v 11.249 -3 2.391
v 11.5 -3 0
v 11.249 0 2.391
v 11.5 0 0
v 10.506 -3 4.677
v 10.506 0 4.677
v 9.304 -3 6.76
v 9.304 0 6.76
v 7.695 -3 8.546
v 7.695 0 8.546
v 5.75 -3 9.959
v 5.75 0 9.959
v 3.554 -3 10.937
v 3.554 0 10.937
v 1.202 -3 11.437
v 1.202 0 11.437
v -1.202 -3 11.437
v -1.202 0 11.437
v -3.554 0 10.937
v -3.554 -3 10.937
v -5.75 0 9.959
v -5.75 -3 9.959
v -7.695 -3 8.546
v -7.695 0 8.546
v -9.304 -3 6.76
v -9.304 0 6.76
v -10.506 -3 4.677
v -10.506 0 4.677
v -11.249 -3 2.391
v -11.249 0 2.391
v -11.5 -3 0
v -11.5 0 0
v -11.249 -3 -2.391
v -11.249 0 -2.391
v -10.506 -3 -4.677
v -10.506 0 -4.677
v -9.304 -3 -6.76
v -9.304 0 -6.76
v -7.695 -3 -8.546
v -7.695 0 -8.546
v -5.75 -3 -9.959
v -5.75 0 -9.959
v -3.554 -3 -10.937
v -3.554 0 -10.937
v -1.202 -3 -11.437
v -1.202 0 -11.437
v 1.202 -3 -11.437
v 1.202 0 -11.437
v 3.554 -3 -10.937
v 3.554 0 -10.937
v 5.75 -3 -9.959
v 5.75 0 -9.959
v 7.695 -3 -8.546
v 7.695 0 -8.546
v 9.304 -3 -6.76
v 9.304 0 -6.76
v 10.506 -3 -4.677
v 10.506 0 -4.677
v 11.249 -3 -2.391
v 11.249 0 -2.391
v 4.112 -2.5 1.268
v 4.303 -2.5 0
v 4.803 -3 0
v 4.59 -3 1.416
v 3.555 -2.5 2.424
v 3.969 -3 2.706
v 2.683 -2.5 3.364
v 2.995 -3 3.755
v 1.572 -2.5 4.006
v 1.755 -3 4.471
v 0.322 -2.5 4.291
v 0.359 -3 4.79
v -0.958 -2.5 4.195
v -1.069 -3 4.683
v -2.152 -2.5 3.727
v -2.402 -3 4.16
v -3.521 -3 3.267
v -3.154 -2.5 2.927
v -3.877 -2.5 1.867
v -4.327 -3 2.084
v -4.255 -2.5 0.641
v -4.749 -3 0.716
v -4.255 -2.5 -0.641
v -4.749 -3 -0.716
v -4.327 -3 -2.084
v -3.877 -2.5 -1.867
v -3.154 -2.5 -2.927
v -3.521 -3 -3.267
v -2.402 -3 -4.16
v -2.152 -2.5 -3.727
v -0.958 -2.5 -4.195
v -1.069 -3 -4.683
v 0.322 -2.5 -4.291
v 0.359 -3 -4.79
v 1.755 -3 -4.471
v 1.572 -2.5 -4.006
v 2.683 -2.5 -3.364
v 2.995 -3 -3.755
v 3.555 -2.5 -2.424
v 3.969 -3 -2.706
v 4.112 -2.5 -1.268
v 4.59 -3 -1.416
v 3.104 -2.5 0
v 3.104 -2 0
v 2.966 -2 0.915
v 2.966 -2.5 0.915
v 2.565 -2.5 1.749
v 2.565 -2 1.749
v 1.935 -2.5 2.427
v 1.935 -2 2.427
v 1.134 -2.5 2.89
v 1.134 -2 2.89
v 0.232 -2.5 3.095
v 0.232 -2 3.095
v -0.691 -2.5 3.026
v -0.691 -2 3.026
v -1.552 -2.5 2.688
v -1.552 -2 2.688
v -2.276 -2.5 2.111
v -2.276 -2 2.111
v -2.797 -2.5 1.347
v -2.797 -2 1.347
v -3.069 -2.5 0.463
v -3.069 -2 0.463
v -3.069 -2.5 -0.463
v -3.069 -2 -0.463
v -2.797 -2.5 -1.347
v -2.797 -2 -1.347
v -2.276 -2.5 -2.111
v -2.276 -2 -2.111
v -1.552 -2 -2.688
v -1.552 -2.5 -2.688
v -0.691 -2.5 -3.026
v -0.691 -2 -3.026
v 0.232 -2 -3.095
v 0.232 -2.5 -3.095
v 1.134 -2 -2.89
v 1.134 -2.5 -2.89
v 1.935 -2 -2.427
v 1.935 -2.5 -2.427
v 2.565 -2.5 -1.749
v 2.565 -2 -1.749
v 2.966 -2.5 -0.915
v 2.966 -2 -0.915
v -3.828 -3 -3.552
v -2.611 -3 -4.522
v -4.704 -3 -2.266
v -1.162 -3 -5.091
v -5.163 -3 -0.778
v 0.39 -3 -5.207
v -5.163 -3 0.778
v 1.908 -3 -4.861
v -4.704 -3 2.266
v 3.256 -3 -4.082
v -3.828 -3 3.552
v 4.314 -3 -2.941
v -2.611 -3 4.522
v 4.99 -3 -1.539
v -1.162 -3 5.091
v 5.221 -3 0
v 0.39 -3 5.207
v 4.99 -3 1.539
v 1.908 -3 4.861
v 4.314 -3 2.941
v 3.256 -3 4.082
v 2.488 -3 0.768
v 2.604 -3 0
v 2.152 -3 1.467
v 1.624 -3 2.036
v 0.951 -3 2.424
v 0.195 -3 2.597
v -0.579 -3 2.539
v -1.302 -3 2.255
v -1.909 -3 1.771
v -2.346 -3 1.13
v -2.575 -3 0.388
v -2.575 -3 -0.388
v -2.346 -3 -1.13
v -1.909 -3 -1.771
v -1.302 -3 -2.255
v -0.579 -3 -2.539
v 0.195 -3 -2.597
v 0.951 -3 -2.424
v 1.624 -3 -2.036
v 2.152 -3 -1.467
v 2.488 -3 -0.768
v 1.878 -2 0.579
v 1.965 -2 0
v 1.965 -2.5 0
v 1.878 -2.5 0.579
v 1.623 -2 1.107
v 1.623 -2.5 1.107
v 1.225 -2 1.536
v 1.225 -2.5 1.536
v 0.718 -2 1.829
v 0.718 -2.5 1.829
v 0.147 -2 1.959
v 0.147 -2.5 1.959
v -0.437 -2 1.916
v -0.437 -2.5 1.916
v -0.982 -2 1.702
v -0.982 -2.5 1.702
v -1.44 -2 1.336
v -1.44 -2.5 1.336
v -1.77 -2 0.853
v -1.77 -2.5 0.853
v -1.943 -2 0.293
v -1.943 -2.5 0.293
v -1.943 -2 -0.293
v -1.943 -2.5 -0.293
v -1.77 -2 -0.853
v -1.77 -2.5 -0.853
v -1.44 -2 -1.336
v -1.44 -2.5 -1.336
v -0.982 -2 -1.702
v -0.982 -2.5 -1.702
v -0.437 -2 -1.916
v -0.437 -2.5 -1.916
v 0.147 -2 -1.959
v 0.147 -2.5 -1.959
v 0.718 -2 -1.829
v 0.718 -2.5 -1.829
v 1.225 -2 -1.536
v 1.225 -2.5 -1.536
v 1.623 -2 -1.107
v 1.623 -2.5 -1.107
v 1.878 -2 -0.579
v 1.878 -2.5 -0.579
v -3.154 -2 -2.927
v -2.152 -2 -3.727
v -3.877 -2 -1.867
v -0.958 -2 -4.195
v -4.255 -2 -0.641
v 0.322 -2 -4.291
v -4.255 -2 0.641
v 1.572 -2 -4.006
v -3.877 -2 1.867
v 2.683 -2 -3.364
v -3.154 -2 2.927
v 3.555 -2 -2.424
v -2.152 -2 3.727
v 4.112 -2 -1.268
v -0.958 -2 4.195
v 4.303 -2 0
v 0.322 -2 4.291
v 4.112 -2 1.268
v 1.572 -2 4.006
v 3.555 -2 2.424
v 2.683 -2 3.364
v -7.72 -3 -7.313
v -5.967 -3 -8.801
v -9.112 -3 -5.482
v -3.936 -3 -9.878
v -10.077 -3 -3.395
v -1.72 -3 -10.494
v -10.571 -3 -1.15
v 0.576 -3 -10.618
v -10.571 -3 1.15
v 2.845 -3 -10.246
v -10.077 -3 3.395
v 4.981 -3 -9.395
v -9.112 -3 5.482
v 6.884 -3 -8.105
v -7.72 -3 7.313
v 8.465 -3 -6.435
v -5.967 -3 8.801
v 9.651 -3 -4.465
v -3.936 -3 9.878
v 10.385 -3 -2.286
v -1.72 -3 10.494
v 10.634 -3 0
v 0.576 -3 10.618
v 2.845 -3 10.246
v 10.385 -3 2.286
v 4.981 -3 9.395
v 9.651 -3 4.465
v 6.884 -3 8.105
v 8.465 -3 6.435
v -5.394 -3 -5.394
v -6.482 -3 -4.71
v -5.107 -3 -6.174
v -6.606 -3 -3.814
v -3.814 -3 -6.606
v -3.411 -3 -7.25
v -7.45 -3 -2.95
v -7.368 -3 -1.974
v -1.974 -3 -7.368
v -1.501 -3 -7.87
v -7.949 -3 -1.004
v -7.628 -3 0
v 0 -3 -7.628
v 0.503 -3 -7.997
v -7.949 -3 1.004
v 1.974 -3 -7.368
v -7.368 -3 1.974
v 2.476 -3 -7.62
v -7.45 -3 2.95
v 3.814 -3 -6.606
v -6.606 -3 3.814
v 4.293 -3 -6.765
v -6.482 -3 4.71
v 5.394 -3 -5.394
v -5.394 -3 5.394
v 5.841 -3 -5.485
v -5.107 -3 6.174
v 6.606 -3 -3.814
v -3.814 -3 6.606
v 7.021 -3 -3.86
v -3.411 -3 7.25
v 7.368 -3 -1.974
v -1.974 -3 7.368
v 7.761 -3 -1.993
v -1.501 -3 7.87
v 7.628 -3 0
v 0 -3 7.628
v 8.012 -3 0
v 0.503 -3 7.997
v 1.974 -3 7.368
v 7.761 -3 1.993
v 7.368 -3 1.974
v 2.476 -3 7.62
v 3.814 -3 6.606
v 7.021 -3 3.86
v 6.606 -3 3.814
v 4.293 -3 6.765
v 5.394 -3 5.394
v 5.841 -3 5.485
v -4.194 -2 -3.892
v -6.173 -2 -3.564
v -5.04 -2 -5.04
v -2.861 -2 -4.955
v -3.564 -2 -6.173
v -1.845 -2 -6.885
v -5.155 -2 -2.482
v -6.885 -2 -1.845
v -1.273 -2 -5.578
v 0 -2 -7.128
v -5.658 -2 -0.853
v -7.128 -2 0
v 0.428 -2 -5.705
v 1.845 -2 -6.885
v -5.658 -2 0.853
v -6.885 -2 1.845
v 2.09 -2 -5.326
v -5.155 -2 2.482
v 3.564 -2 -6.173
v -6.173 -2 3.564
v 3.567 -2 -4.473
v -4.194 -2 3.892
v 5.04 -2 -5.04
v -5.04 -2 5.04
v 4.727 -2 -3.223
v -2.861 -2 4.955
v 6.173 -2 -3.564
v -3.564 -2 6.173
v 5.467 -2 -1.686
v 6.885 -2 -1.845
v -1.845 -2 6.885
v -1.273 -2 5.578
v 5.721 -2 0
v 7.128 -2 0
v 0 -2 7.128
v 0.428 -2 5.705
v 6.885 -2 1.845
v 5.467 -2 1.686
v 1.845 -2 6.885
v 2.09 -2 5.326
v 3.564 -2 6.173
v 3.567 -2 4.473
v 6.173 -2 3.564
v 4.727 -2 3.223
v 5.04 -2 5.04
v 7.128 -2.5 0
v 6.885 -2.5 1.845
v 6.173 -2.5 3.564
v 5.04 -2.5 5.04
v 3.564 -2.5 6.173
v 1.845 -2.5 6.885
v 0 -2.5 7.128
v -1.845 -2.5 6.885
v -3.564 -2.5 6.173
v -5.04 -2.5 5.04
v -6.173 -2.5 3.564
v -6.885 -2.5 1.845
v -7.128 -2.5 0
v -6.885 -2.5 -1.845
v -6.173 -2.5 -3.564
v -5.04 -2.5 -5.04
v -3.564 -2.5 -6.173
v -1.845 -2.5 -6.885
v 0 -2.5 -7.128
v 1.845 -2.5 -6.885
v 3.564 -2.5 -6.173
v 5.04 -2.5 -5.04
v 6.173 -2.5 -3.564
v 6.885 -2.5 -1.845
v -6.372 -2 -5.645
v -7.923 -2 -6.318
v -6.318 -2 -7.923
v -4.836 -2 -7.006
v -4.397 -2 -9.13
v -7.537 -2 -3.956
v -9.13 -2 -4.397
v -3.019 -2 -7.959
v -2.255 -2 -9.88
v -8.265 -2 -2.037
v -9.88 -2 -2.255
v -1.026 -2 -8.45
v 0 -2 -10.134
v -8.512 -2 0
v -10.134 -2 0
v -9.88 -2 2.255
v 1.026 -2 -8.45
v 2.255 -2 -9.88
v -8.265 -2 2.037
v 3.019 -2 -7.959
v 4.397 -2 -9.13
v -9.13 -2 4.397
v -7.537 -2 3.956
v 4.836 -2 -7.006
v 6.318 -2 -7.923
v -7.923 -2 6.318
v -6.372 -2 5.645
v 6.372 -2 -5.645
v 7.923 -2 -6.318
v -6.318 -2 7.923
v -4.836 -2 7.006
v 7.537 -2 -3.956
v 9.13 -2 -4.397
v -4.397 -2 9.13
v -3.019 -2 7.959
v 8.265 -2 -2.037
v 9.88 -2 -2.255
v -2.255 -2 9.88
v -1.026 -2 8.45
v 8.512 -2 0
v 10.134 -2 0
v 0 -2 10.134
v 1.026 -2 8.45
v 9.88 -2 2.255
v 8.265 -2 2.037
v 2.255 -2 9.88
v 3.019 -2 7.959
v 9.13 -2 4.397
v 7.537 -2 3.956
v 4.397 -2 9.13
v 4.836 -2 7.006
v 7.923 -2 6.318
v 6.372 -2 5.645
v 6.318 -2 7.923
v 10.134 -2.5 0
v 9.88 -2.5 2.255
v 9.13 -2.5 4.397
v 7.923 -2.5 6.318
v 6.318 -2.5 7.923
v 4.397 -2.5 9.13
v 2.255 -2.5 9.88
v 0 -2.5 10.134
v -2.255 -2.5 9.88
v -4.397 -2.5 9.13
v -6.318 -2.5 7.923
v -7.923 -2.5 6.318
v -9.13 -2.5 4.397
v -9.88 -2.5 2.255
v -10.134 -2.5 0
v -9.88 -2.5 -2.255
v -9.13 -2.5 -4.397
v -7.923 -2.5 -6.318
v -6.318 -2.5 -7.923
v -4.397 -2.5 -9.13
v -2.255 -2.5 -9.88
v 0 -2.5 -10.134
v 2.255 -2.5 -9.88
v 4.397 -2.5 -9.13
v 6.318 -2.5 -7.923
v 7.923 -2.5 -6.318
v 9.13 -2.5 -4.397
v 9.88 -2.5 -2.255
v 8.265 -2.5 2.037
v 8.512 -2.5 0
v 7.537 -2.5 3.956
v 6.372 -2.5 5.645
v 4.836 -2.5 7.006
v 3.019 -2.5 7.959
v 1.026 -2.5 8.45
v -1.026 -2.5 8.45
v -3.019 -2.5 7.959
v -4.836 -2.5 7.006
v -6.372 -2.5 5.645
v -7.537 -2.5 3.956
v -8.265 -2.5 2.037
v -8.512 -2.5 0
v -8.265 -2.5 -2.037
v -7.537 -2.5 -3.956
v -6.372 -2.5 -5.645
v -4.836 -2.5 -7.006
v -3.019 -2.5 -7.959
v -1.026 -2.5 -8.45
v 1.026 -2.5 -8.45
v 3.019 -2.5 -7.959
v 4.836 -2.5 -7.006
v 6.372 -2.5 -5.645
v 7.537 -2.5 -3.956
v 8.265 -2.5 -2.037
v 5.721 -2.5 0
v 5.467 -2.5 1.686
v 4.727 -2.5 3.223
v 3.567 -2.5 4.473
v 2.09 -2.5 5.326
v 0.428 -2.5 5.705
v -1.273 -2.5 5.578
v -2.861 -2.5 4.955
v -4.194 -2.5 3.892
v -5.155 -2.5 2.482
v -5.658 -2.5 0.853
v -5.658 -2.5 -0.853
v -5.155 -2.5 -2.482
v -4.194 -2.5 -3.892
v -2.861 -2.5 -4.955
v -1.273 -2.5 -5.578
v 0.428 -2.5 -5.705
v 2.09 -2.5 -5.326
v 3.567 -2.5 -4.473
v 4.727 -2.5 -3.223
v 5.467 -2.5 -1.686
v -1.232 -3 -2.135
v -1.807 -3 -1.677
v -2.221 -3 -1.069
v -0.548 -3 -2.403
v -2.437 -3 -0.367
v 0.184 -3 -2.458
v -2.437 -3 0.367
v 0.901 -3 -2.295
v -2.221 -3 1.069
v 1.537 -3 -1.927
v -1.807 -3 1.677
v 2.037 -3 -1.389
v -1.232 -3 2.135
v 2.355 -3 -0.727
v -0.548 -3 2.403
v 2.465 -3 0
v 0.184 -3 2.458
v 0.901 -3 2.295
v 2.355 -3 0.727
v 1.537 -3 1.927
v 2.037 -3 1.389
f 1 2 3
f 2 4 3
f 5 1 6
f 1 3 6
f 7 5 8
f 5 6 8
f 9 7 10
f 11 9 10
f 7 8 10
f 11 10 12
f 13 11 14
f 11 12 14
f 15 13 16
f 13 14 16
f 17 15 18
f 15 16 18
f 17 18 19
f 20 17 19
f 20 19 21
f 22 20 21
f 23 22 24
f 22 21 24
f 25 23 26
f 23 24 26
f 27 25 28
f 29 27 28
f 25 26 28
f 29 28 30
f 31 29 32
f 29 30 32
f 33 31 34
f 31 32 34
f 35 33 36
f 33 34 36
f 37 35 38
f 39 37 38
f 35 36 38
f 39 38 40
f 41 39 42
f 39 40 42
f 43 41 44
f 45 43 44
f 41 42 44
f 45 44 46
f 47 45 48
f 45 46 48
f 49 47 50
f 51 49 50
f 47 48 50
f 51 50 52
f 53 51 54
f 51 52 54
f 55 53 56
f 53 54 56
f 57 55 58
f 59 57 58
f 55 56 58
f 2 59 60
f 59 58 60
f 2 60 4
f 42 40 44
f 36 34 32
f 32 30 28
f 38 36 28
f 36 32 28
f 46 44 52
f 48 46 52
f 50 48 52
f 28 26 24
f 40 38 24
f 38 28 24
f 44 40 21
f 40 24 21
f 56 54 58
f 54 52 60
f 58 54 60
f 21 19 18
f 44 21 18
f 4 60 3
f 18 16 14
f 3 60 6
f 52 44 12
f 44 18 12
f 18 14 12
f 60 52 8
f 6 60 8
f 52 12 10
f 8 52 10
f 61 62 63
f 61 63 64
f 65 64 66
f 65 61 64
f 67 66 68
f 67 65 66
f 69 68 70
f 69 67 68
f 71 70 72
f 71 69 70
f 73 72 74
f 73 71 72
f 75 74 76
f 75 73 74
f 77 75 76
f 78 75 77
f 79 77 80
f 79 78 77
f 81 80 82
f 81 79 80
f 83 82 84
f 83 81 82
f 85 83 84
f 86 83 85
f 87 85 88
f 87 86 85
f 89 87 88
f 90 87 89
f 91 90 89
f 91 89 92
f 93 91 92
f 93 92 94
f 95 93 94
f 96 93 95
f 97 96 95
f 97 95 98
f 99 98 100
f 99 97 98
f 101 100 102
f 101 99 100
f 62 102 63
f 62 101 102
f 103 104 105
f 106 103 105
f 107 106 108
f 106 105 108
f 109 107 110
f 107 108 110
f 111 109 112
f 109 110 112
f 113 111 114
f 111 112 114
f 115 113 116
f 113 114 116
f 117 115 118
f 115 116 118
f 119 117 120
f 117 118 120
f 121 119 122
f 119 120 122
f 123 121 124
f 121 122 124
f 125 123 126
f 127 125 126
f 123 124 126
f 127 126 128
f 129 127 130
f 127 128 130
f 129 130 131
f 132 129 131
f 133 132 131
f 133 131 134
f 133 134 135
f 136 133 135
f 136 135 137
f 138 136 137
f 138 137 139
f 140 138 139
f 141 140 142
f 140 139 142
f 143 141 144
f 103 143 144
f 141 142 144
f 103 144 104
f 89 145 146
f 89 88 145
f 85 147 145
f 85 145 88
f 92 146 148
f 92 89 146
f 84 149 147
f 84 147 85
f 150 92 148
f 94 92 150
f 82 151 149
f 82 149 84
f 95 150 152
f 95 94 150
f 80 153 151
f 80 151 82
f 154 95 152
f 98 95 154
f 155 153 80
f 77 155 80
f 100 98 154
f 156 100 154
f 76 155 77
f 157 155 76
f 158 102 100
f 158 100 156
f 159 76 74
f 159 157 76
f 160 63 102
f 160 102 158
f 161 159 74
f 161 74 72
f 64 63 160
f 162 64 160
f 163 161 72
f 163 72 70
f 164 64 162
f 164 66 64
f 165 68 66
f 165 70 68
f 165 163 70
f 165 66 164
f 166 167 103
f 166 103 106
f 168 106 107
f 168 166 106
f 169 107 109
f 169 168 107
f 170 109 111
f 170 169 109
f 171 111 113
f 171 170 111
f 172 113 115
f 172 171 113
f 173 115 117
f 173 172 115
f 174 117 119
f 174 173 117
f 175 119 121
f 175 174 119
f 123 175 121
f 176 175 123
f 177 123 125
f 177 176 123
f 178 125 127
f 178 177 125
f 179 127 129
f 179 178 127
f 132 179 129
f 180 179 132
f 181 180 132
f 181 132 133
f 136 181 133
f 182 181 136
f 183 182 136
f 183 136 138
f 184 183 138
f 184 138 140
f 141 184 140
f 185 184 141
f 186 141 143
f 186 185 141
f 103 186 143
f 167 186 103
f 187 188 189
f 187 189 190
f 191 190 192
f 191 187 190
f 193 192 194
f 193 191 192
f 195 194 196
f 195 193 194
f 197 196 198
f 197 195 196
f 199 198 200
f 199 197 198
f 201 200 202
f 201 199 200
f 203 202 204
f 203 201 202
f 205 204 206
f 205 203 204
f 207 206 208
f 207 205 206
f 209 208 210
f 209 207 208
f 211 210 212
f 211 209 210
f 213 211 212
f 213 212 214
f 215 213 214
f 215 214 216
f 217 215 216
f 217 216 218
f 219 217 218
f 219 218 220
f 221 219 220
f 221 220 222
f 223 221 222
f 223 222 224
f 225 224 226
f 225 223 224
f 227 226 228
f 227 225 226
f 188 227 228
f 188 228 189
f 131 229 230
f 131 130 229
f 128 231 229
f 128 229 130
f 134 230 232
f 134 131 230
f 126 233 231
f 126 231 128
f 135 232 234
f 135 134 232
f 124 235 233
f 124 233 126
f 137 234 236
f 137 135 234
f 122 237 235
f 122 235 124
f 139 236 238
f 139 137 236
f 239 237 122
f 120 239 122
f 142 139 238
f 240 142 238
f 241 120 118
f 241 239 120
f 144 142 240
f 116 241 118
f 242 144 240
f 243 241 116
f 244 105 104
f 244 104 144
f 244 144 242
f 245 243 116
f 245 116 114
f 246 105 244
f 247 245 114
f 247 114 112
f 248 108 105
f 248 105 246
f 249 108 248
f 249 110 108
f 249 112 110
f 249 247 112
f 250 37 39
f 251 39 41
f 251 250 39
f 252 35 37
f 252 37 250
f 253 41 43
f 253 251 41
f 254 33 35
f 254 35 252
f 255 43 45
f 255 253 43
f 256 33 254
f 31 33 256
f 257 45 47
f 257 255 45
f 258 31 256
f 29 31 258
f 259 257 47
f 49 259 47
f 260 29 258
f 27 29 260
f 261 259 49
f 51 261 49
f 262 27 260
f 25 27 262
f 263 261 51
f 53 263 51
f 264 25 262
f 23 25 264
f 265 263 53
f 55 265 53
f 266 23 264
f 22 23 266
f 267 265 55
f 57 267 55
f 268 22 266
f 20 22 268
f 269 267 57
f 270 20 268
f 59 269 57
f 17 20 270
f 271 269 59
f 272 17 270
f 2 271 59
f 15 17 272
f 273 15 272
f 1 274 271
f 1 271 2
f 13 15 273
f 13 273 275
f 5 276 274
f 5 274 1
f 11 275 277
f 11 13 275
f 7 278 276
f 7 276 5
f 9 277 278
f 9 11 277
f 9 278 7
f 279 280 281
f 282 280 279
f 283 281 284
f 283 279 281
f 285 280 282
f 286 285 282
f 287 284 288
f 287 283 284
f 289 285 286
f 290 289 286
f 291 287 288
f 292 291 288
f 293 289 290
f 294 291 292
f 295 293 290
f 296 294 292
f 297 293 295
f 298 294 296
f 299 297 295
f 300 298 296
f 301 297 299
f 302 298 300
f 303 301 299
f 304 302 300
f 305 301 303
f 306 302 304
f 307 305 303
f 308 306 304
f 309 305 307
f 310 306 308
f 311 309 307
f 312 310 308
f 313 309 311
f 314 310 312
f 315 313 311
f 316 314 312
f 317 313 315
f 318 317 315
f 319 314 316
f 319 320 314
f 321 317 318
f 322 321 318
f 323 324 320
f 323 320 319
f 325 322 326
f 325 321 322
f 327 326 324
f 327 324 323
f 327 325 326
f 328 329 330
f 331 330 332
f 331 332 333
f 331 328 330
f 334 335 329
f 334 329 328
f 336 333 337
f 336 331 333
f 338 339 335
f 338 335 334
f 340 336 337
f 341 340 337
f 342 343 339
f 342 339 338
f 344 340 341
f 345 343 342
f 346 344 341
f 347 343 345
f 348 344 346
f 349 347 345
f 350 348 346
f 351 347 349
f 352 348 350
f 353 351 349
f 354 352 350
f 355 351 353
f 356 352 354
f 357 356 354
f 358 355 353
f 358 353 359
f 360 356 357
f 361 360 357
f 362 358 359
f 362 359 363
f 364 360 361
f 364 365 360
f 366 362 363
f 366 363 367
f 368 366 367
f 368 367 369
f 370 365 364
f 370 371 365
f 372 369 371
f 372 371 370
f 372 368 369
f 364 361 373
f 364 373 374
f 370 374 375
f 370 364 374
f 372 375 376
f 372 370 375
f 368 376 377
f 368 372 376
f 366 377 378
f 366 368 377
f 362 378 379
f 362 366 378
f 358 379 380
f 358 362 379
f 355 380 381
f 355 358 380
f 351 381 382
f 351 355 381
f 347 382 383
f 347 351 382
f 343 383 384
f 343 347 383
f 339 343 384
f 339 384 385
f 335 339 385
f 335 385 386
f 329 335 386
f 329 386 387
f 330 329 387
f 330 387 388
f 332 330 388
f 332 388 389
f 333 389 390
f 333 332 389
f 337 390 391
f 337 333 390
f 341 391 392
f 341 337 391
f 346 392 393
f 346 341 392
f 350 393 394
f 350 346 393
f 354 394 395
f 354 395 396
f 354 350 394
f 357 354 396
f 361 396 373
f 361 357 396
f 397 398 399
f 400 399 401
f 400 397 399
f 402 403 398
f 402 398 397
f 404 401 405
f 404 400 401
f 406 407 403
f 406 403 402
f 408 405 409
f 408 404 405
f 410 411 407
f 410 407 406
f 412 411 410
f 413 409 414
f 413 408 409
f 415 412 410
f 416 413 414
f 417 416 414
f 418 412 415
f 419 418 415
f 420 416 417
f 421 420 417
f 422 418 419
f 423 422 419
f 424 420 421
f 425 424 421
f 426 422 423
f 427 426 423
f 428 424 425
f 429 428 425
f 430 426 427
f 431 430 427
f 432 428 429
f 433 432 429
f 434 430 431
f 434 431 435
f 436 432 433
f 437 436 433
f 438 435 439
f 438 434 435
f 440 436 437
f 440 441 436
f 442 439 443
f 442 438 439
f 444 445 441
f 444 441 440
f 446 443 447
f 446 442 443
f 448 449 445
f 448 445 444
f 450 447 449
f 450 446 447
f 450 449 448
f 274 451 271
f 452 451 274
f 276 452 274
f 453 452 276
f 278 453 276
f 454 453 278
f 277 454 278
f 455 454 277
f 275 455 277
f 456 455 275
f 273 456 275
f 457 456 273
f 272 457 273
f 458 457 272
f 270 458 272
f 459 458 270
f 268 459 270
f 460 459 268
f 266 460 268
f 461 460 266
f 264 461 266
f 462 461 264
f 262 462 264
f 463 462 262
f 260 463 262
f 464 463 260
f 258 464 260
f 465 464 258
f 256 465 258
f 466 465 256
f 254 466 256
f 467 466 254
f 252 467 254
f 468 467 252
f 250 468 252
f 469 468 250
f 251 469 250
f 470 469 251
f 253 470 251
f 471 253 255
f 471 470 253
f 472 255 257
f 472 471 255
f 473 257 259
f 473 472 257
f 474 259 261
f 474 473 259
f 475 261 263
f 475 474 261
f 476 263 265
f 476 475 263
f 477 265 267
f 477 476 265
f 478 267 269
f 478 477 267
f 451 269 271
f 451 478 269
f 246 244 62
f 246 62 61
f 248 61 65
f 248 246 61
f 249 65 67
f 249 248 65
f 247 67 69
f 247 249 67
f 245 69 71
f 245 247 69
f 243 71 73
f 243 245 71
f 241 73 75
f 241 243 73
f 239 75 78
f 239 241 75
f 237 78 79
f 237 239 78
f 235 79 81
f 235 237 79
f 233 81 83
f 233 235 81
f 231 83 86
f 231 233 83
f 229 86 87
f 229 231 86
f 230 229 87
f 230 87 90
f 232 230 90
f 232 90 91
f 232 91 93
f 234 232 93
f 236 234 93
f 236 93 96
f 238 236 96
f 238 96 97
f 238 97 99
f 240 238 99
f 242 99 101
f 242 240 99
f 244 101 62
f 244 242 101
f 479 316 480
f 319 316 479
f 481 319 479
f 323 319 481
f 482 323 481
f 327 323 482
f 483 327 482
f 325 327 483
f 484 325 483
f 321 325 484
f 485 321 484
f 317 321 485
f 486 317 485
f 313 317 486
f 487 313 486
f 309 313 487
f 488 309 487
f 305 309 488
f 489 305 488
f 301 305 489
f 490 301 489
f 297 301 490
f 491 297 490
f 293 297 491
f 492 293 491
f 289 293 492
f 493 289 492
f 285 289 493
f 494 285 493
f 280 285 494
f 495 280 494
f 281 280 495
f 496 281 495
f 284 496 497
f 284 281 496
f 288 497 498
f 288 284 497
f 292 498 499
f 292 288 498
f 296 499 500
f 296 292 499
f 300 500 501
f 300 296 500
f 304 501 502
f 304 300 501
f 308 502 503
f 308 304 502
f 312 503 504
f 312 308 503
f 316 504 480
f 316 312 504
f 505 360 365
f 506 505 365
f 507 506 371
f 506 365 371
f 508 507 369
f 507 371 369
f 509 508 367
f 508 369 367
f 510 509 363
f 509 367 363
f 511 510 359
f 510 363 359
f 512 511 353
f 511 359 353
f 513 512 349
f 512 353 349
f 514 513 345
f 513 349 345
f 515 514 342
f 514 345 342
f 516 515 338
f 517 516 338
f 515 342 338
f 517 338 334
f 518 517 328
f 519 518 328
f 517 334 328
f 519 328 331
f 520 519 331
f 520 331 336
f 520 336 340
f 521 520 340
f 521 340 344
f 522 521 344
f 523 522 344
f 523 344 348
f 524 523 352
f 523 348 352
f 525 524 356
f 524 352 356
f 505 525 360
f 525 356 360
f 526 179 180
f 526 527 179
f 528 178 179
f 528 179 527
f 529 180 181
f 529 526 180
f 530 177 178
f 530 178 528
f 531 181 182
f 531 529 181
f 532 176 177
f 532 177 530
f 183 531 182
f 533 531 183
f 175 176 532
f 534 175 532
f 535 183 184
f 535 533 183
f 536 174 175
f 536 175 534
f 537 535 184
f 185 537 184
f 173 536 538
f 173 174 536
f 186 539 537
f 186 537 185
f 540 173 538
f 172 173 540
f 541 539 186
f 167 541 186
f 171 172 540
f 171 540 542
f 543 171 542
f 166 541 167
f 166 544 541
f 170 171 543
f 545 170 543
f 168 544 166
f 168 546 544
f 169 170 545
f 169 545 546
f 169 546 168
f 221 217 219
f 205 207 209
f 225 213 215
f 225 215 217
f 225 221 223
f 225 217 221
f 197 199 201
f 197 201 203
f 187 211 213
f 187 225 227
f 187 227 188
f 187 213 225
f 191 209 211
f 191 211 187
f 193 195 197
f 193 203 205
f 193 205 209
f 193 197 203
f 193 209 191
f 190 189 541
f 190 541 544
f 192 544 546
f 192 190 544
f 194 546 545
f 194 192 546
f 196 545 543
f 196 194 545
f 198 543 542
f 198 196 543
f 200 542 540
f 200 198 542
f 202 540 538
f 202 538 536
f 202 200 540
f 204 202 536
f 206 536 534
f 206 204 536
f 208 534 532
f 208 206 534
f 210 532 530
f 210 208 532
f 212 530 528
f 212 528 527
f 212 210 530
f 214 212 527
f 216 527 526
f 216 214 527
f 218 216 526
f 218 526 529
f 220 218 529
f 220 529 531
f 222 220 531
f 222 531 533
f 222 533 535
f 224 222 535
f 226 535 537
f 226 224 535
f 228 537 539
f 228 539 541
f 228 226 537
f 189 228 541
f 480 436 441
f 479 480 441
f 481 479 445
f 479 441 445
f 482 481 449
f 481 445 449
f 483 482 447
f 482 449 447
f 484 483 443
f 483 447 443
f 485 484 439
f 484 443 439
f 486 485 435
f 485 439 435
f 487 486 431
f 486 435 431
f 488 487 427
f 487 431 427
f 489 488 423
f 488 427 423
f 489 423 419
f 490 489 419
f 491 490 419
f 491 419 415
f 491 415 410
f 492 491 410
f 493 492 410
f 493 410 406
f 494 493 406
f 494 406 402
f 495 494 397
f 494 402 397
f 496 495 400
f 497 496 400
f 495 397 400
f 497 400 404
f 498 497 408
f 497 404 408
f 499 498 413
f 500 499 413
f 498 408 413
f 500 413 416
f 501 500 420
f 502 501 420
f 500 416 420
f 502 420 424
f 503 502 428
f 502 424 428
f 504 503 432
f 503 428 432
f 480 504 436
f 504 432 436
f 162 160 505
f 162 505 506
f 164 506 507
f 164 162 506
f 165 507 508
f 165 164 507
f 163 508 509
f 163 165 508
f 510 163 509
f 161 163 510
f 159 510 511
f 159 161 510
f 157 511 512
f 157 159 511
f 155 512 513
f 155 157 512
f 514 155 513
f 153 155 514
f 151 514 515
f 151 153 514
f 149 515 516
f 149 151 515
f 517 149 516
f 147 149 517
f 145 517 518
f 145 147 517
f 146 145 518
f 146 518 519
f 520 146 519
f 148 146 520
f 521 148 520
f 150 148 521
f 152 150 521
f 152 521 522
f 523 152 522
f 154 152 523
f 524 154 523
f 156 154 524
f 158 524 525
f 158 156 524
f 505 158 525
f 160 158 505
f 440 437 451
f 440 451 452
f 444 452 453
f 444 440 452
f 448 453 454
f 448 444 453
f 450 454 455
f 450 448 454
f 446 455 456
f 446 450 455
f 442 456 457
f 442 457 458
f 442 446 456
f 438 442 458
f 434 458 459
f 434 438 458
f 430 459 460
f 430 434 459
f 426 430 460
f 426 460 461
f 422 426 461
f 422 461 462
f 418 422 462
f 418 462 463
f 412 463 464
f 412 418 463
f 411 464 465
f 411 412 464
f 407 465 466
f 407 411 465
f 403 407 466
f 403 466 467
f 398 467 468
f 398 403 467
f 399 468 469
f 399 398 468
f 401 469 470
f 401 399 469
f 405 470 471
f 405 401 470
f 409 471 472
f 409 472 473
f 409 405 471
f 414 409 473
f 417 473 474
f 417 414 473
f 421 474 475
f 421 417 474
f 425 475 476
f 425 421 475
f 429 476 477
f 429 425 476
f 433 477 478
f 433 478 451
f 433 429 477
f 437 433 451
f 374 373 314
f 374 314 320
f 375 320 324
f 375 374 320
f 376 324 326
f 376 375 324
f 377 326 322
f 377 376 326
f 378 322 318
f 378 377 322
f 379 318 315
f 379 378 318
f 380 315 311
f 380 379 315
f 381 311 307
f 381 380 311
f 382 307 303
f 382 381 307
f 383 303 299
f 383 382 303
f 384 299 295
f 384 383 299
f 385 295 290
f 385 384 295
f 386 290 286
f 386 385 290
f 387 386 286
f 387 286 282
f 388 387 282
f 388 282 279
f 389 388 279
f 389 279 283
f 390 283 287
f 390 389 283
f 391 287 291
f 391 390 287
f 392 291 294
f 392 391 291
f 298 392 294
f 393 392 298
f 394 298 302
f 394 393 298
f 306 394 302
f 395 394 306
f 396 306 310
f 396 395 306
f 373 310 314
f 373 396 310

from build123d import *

# Parameters (mm, degrees)
F0_R     = 11.5
F1_DEPTH = 2
F2_R     = 11.5
F2_R_2   = 10.133636
F2_R_3   = 8.512332
F2_R_4   = 7.127684
F2_R_5   = 5.721488
F2_R_6   = 4.303126
F2_R_7   = 3.104156
F2_R_8   = 1.964911
F3_DEPTH = 1
F4_SIZE  = 0.5
F5_SIZE  = 0.5


with BuildPart() as f1:
    # F0 (on Front) → F1 (new body)
    with BuildSketch(Plane.XZ):
        Circle(F0_R)
    extrude(amount=F1_DEPTH)

    # F2 (on face) → F3 (join)
    with BuildSketch(Plane.XZ.offset(2)):
        Circle(F2_R)
        Circle(F2_R_2, mode=Mode.SUBTRACT)
        Circle(F2_R_3)
        Circle(F2_R_4, mode=Mode.SUBTRACT)
        Circle(F2_R_5)
        Circle(F2_R_6, mode=Mode.SUBTRACT)
        Circle(F2_R_7)
        Circle(F2_R_8, mode=Mode.SUBTRACT)
    extrude(amount=F3_DEPTH)

    # F4
    f4_edges = [f1.edges().sort_by_distance(p)[0] for p in [
        (-1.964911, -3, 0),
        (-4.303126, -3, 0),
        (-7.127684, -3, 0),
        (-10.133636, -3, 0),
    ]]
    chamfer(f4_edges, length=F4_SIZE)

    # F5
    f5_edges = [f1.edges().sort_by_distance(p)[0] for p in [
        (-3.104156, -3, 0),
        (-5.721488, -3, 0),
        (-8.512332, -3, 0),
    ]]
    chamfer(f5_edges, length=F5_SIZE)


solid = f1.part
